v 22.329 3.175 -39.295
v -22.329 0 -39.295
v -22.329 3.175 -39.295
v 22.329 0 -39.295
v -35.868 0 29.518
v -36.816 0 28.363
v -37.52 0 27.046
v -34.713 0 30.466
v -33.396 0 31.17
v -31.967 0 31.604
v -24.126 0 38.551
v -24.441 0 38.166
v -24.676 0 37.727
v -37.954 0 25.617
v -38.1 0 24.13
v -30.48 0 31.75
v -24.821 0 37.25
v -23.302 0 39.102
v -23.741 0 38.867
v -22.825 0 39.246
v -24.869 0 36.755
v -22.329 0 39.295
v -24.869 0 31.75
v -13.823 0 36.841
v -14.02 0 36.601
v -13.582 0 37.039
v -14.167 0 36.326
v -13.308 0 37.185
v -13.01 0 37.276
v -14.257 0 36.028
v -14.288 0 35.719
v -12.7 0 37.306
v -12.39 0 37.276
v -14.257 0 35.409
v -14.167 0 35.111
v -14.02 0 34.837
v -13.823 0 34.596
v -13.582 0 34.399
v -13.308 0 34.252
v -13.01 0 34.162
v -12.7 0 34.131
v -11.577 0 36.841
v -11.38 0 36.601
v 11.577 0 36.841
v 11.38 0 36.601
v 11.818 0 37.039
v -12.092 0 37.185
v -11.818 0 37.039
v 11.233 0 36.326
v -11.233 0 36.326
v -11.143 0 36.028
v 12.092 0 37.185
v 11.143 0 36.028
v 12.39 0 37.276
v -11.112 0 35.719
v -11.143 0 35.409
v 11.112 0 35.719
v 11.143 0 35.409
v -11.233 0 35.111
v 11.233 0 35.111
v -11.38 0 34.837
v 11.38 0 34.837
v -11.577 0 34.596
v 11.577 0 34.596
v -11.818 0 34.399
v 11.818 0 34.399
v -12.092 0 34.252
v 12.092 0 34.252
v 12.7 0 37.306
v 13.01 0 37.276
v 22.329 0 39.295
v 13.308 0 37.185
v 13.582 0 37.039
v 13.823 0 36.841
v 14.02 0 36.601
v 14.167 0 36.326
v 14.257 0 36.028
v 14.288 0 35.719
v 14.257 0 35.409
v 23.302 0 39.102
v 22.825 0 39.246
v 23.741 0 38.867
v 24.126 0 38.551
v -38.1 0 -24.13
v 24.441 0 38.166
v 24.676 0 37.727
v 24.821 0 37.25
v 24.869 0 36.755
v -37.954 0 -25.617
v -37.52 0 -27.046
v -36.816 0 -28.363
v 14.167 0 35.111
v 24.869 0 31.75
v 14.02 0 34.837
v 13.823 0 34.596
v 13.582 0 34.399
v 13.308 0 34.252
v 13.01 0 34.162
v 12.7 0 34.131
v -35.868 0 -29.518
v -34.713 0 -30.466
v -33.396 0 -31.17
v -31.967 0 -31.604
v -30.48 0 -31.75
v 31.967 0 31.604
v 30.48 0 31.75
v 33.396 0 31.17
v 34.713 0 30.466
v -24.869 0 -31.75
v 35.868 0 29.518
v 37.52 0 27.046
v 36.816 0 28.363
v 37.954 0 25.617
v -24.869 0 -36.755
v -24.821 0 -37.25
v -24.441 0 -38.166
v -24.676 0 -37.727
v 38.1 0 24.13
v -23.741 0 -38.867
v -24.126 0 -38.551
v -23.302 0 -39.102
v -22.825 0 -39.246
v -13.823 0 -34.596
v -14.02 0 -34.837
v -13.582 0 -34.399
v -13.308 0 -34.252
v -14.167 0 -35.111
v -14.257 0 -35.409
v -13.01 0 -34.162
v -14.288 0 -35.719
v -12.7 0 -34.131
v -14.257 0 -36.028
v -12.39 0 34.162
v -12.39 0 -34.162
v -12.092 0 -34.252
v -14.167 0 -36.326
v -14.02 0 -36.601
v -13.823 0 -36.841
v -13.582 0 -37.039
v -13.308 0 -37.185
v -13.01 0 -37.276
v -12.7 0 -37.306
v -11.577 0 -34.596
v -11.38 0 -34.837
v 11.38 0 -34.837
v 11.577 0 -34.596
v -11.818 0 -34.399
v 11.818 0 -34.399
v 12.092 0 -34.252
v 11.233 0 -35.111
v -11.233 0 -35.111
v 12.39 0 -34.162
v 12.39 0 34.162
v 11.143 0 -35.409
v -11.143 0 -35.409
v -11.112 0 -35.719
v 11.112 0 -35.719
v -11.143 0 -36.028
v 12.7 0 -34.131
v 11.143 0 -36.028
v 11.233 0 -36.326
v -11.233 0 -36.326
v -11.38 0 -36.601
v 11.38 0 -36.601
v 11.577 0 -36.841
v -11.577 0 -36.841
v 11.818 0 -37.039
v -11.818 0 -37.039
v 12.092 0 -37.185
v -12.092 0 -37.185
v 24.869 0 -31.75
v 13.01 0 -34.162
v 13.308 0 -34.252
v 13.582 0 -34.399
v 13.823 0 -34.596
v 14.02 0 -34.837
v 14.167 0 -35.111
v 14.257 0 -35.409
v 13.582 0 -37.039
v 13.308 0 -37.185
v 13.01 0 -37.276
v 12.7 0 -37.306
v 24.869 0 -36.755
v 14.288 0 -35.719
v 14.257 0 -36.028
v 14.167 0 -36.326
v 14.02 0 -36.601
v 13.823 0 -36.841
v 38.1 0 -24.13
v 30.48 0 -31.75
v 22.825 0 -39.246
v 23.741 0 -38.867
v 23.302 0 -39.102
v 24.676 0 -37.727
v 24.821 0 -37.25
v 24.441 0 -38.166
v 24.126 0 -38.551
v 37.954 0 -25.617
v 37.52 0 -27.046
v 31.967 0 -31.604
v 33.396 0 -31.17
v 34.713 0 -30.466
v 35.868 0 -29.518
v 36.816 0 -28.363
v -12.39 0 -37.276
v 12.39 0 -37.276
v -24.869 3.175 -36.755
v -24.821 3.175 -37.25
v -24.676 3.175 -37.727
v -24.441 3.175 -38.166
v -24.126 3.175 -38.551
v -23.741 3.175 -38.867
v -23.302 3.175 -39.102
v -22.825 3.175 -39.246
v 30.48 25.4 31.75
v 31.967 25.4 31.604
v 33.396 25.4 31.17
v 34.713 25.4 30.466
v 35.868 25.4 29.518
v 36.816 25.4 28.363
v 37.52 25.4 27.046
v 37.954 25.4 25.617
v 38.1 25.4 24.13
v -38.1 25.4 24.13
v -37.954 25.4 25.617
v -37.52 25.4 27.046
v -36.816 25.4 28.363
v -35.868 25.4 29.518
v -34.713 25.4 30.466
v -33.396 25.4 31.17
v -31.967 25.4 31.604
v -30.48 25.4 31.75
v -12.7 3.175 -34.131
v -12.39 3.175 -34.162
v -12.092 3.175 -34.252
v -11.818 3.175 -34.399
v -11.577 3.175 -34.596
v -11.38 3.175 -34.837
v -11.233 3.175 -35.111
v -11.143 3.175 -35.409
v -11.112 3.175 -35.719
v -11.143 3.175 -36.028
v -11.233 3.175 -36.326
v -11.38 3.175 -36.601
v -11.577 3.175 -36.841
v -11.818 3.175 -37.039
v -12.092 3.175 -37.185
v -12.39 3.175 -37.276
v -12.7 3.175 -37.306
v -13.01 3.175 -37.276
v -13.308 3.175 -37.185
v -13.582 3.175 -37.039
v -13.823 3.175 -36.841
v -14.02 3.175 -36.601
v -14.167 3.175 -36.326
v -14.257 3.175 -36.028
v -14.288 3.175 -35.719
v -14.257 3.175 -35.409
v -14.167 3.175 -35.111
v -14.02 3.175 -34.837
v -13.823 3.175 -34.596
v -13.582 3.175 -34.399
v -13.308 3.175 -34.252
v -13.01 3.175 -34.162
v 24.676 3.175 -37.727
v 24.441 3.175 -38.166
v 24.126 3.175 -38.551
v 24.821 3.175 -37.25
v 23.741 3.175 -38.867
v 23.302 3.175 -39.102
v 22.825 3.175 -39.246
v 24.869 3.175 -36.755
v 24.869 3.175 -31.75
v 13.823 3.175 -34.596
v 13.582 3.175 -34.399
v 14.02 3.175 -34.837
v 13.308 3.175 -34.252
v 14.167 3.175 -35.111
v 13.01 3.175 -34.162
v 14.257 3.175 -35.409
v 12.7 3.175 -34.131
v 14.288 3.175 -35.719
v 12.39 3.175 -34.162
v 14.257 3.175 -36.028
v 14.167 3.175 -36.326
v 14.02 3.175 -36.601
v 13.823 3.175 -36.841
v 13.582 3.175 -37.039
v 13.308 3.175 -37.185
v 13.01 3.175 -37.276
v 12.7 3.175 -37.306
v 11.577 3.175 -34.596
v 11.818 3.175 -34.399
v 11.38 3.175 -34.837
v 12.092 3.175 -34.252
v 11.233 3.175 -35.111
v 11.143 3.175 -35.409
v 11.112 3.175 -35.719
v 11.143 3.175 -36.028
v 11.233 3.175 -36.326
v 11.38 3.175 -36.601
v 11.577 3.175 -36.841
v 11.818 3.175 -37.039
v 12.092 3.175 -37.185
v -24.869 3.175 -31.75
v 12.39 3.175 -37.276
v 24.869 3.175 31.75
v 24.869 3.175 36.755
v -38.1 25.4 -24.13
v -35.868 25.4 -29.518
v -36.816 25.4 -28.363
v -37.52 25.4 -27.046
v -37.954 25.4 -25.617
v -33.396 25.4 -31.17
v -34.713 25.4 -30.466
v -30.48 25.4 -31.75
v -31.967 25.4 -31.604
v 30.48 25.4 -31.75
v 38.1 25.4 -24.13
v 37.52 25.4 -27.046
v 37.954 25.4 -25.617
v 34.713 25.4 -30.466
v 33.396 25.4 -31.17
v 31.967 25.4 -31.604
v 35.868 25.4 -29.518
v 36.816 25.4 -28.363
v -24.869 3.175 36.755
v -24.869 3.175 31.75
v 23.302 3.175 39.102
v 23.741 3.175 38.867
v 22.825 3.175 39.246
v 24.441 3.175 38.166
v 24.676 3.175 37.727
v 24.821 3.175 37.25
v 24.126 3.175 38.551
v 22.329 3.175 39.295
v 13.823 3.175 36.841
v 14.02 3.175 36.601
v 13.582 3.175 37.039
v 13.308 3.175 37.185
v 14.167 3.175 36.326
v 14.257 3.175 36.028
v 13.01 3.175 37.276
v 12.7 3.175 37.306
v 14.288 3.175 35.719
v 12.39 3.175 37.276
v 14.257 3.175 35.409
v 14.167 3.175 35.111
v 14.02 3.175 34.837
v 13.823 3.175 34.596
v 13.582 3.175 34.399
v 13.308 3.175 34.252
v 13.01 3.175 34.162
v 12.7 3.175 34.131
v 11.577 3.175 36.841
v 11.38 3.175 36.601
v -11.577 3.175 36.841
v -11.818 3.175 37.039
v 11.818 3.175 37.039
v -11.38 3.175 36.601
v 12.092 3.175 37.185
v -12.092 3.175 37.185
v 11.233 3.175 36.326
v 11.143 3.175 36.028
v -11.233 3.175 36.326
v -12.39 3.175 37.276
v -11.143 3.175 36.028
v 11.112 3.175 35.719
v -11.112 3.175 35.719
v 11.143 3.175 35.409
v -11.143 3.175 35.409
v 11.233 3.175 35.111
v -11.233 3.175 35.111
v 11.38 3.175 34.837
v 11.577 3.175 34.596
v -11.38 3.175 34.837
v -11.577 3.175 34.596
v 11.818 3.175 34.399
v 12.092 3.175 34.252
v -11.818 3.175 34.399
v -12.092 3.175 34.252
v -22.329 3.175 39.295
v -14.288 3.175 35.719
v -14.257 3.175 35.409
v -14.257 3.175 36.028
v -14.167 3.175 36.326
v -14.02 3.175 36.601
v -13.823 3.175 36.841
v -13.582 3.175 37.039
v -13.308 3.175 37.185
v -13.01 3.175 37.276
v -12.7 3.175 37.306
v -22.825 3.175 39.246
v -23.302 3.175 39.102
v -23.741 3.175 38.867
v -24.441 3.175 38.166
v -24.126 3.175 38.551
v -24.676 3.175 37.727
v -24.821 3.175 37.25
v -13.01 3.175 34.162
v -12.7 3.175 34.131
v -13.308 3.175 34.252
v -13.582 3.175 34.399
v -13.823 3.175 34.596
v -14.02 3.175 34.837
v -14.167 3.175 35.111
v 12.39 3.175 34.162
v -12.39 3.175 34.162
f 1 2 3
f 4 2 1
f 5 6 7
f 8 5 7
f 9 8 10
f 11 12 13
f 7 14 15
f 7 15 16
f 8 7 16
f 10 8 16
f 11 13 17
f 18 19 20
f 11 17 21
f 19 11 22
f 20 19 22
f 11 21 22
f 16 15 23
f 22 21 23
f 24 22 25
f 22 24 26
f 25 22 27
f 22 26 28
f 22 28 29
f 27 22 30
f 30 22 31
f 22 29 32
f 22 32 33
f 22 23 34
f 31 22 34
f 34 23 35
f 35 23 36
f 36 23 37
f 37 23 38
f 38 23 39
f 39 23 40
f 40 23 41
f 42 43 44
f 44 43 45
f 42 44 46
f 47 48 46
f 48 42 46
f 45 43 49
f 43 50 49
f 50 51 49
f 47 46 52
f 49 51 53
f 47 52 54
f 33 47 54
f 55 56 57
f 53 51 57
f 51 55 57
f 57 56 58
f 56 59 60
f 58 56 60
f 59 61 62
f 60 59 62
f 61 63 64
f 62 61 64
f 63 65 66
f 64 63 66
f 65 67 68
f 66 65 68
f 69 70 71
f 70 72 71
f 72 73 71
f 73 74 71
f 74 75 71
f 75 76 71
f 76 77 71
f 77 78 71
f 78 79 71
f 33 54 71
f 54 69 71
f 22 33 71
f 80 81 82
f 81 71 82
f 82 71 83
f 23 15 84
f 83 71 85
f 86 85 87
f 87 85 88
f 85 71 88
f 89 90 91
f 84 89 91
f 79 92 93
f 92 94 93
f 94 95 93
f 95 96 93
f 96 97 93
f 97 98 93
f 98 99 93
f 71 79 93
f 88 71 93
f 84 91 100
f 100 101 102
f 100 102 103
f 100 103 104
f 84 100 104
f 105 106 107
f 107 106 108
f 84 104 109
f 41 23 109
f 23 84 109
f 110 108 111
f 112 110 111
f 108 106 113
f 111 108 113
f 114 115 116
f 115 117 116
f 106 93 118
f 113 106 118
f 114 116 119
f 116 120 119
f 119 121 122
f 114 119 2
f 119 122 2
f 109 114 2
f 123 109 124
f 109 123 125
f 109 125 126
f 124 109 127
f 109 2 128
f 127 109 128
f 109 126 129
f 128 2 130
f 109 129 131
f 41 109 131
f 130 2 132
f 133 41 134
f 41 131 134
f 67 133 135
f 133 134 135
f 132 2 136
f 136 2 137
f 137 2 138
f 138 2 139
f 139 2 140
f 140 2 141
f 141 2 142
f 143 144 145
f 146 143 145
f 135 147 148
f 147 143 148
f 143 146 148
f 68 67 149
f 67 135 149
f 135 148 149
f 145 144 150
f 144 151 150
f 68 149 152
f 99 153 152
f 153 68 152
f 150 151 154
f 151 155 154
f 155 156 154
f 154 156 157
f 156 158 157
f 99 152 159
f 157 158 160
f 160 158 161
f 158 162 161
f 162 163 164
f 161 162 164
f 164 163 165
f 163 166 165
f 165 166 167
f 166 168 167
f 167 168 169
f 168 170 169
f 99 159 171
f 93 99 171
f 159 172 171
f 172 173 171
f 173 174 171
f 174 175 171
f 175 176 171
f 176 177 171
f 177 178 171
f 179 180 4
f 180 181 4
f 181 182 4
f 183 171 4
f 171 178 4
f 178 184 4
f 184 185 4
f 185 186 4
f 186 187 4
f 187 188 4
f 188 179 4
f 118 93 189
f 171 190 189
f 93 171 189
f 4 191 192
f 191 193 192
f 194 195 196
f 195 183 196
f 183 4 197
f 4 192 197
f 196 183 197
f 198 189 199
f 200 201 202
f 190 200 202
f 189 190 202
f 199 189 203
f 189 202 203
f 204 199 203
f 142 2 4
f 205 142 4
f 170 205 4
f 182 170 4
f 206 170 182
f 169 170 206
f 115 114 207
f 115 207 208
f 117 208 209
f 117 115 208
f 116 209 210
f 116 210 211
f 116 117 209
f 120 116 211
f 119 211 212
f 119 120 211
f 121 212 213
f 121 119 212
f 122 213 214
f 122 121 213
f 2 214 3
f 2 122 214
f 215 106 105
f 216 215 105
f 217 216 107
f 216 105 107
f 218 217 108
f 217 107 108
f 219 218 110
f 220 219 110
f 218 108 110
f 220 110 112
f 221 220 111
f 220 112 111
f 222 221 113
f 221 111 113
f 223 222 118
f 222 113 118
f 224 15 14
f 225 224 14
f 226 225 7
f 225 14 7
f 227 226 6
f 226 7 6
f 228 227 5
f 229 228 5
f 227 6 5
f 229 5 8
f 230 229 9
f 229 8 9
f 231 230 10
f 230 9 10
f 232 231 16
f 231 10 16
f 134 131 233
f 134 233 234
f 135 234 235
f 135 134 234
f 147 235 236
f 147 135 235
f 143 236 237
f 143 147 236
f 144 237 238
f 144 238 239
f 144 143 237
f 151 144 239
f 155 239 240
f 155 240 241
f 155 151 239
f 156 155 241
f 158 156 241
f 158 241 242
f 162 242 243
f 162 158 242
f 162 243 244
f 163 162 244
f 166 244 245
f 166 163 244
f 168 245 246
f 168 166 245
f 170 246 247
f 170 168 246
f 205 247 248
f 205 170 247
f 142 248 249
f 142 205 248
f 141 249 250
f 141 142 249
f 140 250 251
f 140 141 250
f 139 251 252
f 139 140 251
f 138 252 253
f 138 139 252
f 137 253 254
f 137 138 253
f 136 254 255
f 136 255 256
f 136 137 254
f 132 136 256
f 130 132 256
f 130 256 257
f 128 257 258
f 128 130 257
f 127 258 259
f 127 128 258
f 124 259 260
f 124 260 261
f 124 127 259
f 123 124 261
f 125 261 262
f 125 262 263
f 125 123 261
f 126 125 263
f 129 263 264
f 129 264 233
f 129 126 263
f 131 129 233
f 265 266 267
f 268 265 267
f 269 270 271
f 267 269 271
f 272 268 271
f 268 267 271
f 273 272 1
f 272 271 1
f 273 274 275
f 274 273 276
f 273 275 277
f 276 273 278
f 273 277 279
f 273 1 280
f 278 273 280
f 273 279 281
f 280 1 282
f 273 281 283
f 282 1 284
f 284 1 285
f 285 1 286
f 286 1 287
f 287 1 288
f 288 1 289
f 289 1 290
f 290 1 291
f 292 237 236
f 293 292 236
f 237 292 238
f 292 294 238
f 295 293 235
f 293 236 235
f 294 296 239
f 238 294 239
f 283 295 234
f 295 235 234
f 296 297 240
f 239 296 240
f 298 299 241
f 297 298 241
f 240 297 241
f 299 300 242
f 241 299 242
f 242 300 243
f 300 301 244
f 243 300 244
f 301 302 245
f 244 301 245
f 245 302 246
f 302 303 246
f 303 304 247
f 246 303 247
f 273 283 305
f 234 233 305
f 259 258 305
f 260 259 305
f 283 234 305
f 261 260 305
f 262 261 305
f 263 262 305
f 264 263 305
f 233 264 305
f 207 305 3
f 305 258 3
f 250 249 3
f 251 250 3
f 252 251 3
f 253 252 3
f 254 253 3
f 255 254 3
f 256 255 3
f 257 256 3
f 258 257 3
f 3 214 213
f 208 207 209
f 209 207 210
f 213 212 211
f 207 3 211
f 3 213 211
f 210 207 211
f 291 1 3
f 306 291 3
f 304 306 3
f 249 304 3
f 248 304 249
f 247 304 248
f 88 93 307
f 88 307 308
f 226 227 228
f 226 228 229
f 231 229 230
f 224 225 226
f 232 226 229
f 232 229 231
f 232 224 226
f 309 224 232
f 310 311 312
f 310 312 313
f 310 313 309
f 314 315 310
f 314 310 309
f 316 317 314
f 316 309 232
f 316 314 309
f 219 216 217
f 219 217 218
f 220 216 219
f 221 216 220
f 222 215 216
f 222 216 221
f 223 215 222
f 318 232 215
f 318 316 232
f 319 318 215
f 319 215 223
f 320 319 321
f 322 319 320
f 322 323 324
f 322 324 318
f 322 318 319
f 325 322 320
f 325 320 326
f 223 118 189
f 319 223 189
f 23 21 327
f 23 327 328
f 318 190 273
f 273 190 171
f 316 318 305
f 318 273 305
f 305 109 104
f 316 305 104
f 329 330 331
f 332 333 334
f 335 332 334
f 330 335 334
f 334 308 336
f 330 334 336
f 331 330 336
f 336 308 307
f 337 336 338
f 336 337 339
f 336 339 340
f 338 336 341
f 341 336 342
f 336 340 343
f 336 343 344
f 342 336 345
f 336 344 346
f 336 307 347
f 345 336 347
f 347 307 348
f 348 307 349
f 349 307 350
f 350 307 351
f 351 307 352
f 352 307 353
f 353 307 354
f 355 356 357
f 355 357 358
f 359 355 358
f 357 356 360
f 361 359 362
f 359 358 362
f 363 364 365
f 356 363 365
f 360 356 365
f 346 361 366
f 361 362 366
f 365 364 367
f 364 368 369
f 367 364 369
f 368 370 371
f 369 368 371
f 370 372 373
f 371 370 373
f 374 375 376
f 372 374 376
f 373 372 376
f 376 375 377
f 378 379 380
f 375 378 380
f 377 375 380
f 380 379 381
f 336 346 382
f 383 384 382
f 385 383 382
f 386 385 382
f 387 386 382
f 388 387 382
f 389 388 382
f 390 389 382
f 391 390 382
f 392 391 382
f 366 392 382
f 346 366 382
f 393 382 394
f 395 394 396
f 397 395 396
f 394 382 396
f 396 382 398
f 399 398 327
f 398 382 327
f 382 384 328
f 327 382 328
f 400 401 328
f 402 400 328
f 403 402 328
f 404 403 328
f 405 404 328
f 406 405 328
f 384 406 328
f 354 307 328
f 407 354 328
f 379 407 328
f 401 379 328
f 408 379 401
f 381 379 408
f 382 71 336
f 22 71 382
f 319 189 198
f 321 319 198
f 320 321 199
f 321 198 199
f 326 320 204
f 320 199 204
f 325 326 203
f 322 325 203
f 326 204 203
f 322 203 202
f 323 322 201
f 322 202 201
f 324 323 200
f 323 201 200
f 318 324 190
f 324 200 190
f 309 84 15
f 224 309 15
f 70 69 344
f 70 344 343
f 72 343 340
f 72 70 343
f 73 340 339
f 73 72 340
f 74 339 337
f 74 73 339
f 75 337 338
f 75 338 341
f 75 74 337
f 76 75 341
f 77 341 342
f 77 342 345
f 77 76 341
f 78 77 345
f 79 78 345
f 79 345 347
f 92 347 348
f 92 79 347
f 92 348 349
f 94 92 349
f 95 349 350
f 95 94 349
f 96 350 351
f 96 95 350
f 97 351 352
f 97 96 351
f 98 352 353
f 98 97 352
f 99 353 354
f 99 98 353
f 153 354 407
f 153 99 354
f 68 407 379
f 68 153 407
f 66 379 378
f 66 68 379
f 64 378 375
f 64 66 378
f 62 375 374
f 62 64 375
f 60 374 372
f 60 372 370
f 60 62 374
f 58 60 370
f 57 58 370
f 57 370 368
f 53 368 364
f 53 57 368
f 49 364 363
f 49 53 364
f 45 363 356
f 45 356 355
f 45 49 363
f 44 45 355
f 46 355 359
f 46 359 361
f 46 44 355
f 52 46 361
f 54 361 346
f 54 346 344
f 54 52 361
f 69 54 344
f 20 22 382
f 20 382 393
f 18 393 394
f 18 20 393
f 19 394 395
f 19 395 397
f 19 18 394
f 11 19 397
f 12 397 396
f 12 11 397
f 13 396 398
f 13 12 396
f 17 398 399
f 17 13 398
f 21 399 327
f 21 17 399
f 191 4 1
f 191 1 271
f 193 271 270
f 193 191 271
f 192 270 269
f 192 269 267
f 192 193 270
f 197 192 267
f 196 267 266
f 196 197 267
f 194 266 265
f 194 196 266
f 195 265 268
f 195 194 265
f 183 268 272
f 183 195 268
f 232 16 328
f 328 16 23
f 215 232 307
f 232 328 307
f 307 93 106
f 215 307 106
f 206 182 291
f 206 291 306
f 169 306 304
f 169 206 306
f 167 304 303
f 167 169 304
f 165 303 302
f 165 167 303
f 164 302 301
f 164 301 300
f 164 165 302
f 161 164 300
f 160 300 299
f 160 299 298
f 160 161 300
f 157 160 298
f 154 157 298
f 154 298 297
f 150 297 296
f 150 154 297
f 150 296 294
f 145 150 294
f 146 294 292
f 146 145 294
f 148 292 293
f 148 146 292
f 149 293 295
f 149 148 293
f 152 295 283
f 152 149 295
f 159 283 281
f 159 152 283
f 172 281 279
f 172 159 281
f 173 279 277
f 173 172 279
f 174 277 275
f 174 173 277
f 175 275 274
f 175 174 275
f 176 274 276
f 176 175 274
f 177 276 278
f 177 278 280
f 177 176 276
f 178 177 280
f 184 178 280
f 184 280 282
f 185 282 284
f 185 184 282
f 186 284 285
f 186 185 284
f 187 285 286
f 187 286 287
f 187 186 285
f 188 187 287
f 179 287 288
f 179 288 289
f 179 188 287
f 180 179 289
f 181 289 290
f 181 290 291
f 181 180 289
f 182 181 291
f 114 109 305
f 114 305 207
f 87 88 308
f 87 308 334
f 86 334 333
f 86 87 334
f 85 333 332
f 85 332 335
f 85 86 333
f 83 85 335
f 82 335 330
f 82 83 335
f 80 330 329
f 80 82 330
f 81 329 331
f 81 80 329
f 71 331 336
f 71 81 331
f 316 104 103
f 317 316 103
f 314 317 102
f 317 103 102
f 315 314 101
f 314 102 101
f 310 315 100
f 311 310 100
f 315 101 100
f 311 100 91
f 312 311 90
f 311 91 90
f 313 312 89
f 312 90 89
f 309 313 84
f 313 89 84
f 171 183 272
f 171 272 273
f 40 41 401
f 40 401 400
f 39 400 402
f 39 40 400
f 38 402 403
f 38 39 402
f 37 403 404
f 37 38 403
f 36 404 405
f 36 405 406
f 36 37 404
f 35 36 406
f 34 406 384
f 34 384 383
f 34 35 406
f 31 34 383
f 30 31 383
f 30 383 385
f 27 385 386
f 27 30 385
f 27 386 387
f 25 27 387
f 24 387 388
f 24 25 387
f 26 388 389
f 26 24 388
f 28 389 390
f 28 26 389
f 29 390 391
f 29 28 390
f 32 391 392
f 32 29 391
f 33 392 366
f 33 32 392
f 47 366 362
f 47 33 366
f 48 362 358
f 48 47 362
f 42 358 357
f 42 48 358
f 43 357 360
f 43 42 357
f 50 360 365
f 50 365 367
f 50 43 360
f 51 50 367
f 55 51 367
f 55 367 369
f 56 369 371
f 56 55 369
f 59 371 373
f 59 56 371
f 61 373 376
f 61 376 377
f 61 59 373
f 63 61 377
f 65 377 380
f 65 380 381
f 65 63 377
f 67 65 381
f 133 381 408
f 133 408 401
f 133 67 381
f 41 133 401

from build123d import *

# Parameters (mm, degrees)
BOSS_EXTRUDE1_DEPTH = 25.4
SKETCH2_R           = 1.5875
BOSS_EXTRUDE2_DEPTH = 3.175


with BuildPart() as part:
    # Sketch1 → Boss-Extrude1 (new body)
    with BuildSketch(Plane(origin=(0, 0, 0), x_dir=(1, 0, 0), z_dir=(0, 1, 0))):
        with BuildLine():
            Line((-30.48, -31.75), (30.48, -31.75))
            ThreePointArc((30.48, -31.75), (35.868153673, -29.518153673), (38.1, -24.13))
            Line((38.1, -24.13), (38.1, 24.13))
            ThreePointArc((38.1, 24.13), (35.868153673, 29.518153673), (30.48, 31.75))
            Line((30.48, 31.75), (-30.48, 31.75))
            ThreePointArc((-30.48, 31.75), (-35.868153673, 29.518153673), (-38.1, 24.13))
            Line((-38.1, 24.13), (-38.1, -24.13))
            ThreePointArc((-38.1, -24.13), (-35.868153673, -29.518153673), (-30.48, -31.75))
        make_face()
    extrude(amount=BOSS_EXTRUDE1_DEPTH)

    # Sketch2 → Boss-Extrude2 (add)
    # profile 1 of 2: a face of its own
    with BuildSketch(Plane(origin=(0, 0, 0), x_dir=(1, 0, 0), z_dir=(0, 1, 0))):
        with BuildLine():
            Line((-24.869490834, -31.75), (24.869490834, -31.75))
            Line((24.869490834, -31.75), (24.869490834, -36.754911613))
            ThreePointArc((24.869490834, -36.754911613), (24.125542058, -38.550962837), (22.329490834, -39.294911613))
            Line((22.329490834, -39.294911613), (-22.329490834, -39.294911613))
            ThreePointArc((-22.329490834, -39.294911613), (-24.125542058, -38.550962837), (-24.869490834, -36.754911613))
            Line((-24.869490834, -36.754911613), (-24.869490834, -31.75))
        make_face()
        with Locations(Location((12.7, -35.71875, 0), (0, 0, 270))):
            Circle(SKETCH2_R, mode=Mode.SUBTRACT)
        with Locations(Location((-12.7, -35.71875, 0), (0, 0, 90))):
            Circle(SKETCH2_R, mode=Mode.SUBTRACT)
    # profile 2 of 2: a face of its own
    with BuildSketch(Plane(origin=(0, 0, 0), x_dir=(1, 0, 0), z_dir=(0, 1, 0))):
        with BuildLine():
            Line((-24.869490834, 31.75), (-24.869490834, 36.754911613))
            ThreePointArc((-24.869490834, 36.754911613), (-24.125542058, 38.550962837), (-22.329490834, 39.294911613))
            Line((-22.329490834, 39.294911613), (22.329490834, 39.294911613))
            ThreePointArc((22.329490834, 39.294911613), (24.125542058, 38.550962837), (24.869490834, 36.754911613))
            Line((24.869490834, 36.754911613), (24.869490834, 31.75))
            Line((24.869490834, 31.75), (-24.869490834, 31.75))
        make_face()
        with Locations(Location((12.7, 35.71875, 0), (0, 0, 90))):
            Circle(SKETCH2_R, mode=Mode.SUBTRACT)
        with Locations(Location((-12.7, 35.71875, 0), (0, 0, 270))):
            Circle(SKETCH2_R, mode=Mode.SUBTRACT)
    extrude(amount=BOSS_EXTRUDE2_DEPTH)


solid = part.part
